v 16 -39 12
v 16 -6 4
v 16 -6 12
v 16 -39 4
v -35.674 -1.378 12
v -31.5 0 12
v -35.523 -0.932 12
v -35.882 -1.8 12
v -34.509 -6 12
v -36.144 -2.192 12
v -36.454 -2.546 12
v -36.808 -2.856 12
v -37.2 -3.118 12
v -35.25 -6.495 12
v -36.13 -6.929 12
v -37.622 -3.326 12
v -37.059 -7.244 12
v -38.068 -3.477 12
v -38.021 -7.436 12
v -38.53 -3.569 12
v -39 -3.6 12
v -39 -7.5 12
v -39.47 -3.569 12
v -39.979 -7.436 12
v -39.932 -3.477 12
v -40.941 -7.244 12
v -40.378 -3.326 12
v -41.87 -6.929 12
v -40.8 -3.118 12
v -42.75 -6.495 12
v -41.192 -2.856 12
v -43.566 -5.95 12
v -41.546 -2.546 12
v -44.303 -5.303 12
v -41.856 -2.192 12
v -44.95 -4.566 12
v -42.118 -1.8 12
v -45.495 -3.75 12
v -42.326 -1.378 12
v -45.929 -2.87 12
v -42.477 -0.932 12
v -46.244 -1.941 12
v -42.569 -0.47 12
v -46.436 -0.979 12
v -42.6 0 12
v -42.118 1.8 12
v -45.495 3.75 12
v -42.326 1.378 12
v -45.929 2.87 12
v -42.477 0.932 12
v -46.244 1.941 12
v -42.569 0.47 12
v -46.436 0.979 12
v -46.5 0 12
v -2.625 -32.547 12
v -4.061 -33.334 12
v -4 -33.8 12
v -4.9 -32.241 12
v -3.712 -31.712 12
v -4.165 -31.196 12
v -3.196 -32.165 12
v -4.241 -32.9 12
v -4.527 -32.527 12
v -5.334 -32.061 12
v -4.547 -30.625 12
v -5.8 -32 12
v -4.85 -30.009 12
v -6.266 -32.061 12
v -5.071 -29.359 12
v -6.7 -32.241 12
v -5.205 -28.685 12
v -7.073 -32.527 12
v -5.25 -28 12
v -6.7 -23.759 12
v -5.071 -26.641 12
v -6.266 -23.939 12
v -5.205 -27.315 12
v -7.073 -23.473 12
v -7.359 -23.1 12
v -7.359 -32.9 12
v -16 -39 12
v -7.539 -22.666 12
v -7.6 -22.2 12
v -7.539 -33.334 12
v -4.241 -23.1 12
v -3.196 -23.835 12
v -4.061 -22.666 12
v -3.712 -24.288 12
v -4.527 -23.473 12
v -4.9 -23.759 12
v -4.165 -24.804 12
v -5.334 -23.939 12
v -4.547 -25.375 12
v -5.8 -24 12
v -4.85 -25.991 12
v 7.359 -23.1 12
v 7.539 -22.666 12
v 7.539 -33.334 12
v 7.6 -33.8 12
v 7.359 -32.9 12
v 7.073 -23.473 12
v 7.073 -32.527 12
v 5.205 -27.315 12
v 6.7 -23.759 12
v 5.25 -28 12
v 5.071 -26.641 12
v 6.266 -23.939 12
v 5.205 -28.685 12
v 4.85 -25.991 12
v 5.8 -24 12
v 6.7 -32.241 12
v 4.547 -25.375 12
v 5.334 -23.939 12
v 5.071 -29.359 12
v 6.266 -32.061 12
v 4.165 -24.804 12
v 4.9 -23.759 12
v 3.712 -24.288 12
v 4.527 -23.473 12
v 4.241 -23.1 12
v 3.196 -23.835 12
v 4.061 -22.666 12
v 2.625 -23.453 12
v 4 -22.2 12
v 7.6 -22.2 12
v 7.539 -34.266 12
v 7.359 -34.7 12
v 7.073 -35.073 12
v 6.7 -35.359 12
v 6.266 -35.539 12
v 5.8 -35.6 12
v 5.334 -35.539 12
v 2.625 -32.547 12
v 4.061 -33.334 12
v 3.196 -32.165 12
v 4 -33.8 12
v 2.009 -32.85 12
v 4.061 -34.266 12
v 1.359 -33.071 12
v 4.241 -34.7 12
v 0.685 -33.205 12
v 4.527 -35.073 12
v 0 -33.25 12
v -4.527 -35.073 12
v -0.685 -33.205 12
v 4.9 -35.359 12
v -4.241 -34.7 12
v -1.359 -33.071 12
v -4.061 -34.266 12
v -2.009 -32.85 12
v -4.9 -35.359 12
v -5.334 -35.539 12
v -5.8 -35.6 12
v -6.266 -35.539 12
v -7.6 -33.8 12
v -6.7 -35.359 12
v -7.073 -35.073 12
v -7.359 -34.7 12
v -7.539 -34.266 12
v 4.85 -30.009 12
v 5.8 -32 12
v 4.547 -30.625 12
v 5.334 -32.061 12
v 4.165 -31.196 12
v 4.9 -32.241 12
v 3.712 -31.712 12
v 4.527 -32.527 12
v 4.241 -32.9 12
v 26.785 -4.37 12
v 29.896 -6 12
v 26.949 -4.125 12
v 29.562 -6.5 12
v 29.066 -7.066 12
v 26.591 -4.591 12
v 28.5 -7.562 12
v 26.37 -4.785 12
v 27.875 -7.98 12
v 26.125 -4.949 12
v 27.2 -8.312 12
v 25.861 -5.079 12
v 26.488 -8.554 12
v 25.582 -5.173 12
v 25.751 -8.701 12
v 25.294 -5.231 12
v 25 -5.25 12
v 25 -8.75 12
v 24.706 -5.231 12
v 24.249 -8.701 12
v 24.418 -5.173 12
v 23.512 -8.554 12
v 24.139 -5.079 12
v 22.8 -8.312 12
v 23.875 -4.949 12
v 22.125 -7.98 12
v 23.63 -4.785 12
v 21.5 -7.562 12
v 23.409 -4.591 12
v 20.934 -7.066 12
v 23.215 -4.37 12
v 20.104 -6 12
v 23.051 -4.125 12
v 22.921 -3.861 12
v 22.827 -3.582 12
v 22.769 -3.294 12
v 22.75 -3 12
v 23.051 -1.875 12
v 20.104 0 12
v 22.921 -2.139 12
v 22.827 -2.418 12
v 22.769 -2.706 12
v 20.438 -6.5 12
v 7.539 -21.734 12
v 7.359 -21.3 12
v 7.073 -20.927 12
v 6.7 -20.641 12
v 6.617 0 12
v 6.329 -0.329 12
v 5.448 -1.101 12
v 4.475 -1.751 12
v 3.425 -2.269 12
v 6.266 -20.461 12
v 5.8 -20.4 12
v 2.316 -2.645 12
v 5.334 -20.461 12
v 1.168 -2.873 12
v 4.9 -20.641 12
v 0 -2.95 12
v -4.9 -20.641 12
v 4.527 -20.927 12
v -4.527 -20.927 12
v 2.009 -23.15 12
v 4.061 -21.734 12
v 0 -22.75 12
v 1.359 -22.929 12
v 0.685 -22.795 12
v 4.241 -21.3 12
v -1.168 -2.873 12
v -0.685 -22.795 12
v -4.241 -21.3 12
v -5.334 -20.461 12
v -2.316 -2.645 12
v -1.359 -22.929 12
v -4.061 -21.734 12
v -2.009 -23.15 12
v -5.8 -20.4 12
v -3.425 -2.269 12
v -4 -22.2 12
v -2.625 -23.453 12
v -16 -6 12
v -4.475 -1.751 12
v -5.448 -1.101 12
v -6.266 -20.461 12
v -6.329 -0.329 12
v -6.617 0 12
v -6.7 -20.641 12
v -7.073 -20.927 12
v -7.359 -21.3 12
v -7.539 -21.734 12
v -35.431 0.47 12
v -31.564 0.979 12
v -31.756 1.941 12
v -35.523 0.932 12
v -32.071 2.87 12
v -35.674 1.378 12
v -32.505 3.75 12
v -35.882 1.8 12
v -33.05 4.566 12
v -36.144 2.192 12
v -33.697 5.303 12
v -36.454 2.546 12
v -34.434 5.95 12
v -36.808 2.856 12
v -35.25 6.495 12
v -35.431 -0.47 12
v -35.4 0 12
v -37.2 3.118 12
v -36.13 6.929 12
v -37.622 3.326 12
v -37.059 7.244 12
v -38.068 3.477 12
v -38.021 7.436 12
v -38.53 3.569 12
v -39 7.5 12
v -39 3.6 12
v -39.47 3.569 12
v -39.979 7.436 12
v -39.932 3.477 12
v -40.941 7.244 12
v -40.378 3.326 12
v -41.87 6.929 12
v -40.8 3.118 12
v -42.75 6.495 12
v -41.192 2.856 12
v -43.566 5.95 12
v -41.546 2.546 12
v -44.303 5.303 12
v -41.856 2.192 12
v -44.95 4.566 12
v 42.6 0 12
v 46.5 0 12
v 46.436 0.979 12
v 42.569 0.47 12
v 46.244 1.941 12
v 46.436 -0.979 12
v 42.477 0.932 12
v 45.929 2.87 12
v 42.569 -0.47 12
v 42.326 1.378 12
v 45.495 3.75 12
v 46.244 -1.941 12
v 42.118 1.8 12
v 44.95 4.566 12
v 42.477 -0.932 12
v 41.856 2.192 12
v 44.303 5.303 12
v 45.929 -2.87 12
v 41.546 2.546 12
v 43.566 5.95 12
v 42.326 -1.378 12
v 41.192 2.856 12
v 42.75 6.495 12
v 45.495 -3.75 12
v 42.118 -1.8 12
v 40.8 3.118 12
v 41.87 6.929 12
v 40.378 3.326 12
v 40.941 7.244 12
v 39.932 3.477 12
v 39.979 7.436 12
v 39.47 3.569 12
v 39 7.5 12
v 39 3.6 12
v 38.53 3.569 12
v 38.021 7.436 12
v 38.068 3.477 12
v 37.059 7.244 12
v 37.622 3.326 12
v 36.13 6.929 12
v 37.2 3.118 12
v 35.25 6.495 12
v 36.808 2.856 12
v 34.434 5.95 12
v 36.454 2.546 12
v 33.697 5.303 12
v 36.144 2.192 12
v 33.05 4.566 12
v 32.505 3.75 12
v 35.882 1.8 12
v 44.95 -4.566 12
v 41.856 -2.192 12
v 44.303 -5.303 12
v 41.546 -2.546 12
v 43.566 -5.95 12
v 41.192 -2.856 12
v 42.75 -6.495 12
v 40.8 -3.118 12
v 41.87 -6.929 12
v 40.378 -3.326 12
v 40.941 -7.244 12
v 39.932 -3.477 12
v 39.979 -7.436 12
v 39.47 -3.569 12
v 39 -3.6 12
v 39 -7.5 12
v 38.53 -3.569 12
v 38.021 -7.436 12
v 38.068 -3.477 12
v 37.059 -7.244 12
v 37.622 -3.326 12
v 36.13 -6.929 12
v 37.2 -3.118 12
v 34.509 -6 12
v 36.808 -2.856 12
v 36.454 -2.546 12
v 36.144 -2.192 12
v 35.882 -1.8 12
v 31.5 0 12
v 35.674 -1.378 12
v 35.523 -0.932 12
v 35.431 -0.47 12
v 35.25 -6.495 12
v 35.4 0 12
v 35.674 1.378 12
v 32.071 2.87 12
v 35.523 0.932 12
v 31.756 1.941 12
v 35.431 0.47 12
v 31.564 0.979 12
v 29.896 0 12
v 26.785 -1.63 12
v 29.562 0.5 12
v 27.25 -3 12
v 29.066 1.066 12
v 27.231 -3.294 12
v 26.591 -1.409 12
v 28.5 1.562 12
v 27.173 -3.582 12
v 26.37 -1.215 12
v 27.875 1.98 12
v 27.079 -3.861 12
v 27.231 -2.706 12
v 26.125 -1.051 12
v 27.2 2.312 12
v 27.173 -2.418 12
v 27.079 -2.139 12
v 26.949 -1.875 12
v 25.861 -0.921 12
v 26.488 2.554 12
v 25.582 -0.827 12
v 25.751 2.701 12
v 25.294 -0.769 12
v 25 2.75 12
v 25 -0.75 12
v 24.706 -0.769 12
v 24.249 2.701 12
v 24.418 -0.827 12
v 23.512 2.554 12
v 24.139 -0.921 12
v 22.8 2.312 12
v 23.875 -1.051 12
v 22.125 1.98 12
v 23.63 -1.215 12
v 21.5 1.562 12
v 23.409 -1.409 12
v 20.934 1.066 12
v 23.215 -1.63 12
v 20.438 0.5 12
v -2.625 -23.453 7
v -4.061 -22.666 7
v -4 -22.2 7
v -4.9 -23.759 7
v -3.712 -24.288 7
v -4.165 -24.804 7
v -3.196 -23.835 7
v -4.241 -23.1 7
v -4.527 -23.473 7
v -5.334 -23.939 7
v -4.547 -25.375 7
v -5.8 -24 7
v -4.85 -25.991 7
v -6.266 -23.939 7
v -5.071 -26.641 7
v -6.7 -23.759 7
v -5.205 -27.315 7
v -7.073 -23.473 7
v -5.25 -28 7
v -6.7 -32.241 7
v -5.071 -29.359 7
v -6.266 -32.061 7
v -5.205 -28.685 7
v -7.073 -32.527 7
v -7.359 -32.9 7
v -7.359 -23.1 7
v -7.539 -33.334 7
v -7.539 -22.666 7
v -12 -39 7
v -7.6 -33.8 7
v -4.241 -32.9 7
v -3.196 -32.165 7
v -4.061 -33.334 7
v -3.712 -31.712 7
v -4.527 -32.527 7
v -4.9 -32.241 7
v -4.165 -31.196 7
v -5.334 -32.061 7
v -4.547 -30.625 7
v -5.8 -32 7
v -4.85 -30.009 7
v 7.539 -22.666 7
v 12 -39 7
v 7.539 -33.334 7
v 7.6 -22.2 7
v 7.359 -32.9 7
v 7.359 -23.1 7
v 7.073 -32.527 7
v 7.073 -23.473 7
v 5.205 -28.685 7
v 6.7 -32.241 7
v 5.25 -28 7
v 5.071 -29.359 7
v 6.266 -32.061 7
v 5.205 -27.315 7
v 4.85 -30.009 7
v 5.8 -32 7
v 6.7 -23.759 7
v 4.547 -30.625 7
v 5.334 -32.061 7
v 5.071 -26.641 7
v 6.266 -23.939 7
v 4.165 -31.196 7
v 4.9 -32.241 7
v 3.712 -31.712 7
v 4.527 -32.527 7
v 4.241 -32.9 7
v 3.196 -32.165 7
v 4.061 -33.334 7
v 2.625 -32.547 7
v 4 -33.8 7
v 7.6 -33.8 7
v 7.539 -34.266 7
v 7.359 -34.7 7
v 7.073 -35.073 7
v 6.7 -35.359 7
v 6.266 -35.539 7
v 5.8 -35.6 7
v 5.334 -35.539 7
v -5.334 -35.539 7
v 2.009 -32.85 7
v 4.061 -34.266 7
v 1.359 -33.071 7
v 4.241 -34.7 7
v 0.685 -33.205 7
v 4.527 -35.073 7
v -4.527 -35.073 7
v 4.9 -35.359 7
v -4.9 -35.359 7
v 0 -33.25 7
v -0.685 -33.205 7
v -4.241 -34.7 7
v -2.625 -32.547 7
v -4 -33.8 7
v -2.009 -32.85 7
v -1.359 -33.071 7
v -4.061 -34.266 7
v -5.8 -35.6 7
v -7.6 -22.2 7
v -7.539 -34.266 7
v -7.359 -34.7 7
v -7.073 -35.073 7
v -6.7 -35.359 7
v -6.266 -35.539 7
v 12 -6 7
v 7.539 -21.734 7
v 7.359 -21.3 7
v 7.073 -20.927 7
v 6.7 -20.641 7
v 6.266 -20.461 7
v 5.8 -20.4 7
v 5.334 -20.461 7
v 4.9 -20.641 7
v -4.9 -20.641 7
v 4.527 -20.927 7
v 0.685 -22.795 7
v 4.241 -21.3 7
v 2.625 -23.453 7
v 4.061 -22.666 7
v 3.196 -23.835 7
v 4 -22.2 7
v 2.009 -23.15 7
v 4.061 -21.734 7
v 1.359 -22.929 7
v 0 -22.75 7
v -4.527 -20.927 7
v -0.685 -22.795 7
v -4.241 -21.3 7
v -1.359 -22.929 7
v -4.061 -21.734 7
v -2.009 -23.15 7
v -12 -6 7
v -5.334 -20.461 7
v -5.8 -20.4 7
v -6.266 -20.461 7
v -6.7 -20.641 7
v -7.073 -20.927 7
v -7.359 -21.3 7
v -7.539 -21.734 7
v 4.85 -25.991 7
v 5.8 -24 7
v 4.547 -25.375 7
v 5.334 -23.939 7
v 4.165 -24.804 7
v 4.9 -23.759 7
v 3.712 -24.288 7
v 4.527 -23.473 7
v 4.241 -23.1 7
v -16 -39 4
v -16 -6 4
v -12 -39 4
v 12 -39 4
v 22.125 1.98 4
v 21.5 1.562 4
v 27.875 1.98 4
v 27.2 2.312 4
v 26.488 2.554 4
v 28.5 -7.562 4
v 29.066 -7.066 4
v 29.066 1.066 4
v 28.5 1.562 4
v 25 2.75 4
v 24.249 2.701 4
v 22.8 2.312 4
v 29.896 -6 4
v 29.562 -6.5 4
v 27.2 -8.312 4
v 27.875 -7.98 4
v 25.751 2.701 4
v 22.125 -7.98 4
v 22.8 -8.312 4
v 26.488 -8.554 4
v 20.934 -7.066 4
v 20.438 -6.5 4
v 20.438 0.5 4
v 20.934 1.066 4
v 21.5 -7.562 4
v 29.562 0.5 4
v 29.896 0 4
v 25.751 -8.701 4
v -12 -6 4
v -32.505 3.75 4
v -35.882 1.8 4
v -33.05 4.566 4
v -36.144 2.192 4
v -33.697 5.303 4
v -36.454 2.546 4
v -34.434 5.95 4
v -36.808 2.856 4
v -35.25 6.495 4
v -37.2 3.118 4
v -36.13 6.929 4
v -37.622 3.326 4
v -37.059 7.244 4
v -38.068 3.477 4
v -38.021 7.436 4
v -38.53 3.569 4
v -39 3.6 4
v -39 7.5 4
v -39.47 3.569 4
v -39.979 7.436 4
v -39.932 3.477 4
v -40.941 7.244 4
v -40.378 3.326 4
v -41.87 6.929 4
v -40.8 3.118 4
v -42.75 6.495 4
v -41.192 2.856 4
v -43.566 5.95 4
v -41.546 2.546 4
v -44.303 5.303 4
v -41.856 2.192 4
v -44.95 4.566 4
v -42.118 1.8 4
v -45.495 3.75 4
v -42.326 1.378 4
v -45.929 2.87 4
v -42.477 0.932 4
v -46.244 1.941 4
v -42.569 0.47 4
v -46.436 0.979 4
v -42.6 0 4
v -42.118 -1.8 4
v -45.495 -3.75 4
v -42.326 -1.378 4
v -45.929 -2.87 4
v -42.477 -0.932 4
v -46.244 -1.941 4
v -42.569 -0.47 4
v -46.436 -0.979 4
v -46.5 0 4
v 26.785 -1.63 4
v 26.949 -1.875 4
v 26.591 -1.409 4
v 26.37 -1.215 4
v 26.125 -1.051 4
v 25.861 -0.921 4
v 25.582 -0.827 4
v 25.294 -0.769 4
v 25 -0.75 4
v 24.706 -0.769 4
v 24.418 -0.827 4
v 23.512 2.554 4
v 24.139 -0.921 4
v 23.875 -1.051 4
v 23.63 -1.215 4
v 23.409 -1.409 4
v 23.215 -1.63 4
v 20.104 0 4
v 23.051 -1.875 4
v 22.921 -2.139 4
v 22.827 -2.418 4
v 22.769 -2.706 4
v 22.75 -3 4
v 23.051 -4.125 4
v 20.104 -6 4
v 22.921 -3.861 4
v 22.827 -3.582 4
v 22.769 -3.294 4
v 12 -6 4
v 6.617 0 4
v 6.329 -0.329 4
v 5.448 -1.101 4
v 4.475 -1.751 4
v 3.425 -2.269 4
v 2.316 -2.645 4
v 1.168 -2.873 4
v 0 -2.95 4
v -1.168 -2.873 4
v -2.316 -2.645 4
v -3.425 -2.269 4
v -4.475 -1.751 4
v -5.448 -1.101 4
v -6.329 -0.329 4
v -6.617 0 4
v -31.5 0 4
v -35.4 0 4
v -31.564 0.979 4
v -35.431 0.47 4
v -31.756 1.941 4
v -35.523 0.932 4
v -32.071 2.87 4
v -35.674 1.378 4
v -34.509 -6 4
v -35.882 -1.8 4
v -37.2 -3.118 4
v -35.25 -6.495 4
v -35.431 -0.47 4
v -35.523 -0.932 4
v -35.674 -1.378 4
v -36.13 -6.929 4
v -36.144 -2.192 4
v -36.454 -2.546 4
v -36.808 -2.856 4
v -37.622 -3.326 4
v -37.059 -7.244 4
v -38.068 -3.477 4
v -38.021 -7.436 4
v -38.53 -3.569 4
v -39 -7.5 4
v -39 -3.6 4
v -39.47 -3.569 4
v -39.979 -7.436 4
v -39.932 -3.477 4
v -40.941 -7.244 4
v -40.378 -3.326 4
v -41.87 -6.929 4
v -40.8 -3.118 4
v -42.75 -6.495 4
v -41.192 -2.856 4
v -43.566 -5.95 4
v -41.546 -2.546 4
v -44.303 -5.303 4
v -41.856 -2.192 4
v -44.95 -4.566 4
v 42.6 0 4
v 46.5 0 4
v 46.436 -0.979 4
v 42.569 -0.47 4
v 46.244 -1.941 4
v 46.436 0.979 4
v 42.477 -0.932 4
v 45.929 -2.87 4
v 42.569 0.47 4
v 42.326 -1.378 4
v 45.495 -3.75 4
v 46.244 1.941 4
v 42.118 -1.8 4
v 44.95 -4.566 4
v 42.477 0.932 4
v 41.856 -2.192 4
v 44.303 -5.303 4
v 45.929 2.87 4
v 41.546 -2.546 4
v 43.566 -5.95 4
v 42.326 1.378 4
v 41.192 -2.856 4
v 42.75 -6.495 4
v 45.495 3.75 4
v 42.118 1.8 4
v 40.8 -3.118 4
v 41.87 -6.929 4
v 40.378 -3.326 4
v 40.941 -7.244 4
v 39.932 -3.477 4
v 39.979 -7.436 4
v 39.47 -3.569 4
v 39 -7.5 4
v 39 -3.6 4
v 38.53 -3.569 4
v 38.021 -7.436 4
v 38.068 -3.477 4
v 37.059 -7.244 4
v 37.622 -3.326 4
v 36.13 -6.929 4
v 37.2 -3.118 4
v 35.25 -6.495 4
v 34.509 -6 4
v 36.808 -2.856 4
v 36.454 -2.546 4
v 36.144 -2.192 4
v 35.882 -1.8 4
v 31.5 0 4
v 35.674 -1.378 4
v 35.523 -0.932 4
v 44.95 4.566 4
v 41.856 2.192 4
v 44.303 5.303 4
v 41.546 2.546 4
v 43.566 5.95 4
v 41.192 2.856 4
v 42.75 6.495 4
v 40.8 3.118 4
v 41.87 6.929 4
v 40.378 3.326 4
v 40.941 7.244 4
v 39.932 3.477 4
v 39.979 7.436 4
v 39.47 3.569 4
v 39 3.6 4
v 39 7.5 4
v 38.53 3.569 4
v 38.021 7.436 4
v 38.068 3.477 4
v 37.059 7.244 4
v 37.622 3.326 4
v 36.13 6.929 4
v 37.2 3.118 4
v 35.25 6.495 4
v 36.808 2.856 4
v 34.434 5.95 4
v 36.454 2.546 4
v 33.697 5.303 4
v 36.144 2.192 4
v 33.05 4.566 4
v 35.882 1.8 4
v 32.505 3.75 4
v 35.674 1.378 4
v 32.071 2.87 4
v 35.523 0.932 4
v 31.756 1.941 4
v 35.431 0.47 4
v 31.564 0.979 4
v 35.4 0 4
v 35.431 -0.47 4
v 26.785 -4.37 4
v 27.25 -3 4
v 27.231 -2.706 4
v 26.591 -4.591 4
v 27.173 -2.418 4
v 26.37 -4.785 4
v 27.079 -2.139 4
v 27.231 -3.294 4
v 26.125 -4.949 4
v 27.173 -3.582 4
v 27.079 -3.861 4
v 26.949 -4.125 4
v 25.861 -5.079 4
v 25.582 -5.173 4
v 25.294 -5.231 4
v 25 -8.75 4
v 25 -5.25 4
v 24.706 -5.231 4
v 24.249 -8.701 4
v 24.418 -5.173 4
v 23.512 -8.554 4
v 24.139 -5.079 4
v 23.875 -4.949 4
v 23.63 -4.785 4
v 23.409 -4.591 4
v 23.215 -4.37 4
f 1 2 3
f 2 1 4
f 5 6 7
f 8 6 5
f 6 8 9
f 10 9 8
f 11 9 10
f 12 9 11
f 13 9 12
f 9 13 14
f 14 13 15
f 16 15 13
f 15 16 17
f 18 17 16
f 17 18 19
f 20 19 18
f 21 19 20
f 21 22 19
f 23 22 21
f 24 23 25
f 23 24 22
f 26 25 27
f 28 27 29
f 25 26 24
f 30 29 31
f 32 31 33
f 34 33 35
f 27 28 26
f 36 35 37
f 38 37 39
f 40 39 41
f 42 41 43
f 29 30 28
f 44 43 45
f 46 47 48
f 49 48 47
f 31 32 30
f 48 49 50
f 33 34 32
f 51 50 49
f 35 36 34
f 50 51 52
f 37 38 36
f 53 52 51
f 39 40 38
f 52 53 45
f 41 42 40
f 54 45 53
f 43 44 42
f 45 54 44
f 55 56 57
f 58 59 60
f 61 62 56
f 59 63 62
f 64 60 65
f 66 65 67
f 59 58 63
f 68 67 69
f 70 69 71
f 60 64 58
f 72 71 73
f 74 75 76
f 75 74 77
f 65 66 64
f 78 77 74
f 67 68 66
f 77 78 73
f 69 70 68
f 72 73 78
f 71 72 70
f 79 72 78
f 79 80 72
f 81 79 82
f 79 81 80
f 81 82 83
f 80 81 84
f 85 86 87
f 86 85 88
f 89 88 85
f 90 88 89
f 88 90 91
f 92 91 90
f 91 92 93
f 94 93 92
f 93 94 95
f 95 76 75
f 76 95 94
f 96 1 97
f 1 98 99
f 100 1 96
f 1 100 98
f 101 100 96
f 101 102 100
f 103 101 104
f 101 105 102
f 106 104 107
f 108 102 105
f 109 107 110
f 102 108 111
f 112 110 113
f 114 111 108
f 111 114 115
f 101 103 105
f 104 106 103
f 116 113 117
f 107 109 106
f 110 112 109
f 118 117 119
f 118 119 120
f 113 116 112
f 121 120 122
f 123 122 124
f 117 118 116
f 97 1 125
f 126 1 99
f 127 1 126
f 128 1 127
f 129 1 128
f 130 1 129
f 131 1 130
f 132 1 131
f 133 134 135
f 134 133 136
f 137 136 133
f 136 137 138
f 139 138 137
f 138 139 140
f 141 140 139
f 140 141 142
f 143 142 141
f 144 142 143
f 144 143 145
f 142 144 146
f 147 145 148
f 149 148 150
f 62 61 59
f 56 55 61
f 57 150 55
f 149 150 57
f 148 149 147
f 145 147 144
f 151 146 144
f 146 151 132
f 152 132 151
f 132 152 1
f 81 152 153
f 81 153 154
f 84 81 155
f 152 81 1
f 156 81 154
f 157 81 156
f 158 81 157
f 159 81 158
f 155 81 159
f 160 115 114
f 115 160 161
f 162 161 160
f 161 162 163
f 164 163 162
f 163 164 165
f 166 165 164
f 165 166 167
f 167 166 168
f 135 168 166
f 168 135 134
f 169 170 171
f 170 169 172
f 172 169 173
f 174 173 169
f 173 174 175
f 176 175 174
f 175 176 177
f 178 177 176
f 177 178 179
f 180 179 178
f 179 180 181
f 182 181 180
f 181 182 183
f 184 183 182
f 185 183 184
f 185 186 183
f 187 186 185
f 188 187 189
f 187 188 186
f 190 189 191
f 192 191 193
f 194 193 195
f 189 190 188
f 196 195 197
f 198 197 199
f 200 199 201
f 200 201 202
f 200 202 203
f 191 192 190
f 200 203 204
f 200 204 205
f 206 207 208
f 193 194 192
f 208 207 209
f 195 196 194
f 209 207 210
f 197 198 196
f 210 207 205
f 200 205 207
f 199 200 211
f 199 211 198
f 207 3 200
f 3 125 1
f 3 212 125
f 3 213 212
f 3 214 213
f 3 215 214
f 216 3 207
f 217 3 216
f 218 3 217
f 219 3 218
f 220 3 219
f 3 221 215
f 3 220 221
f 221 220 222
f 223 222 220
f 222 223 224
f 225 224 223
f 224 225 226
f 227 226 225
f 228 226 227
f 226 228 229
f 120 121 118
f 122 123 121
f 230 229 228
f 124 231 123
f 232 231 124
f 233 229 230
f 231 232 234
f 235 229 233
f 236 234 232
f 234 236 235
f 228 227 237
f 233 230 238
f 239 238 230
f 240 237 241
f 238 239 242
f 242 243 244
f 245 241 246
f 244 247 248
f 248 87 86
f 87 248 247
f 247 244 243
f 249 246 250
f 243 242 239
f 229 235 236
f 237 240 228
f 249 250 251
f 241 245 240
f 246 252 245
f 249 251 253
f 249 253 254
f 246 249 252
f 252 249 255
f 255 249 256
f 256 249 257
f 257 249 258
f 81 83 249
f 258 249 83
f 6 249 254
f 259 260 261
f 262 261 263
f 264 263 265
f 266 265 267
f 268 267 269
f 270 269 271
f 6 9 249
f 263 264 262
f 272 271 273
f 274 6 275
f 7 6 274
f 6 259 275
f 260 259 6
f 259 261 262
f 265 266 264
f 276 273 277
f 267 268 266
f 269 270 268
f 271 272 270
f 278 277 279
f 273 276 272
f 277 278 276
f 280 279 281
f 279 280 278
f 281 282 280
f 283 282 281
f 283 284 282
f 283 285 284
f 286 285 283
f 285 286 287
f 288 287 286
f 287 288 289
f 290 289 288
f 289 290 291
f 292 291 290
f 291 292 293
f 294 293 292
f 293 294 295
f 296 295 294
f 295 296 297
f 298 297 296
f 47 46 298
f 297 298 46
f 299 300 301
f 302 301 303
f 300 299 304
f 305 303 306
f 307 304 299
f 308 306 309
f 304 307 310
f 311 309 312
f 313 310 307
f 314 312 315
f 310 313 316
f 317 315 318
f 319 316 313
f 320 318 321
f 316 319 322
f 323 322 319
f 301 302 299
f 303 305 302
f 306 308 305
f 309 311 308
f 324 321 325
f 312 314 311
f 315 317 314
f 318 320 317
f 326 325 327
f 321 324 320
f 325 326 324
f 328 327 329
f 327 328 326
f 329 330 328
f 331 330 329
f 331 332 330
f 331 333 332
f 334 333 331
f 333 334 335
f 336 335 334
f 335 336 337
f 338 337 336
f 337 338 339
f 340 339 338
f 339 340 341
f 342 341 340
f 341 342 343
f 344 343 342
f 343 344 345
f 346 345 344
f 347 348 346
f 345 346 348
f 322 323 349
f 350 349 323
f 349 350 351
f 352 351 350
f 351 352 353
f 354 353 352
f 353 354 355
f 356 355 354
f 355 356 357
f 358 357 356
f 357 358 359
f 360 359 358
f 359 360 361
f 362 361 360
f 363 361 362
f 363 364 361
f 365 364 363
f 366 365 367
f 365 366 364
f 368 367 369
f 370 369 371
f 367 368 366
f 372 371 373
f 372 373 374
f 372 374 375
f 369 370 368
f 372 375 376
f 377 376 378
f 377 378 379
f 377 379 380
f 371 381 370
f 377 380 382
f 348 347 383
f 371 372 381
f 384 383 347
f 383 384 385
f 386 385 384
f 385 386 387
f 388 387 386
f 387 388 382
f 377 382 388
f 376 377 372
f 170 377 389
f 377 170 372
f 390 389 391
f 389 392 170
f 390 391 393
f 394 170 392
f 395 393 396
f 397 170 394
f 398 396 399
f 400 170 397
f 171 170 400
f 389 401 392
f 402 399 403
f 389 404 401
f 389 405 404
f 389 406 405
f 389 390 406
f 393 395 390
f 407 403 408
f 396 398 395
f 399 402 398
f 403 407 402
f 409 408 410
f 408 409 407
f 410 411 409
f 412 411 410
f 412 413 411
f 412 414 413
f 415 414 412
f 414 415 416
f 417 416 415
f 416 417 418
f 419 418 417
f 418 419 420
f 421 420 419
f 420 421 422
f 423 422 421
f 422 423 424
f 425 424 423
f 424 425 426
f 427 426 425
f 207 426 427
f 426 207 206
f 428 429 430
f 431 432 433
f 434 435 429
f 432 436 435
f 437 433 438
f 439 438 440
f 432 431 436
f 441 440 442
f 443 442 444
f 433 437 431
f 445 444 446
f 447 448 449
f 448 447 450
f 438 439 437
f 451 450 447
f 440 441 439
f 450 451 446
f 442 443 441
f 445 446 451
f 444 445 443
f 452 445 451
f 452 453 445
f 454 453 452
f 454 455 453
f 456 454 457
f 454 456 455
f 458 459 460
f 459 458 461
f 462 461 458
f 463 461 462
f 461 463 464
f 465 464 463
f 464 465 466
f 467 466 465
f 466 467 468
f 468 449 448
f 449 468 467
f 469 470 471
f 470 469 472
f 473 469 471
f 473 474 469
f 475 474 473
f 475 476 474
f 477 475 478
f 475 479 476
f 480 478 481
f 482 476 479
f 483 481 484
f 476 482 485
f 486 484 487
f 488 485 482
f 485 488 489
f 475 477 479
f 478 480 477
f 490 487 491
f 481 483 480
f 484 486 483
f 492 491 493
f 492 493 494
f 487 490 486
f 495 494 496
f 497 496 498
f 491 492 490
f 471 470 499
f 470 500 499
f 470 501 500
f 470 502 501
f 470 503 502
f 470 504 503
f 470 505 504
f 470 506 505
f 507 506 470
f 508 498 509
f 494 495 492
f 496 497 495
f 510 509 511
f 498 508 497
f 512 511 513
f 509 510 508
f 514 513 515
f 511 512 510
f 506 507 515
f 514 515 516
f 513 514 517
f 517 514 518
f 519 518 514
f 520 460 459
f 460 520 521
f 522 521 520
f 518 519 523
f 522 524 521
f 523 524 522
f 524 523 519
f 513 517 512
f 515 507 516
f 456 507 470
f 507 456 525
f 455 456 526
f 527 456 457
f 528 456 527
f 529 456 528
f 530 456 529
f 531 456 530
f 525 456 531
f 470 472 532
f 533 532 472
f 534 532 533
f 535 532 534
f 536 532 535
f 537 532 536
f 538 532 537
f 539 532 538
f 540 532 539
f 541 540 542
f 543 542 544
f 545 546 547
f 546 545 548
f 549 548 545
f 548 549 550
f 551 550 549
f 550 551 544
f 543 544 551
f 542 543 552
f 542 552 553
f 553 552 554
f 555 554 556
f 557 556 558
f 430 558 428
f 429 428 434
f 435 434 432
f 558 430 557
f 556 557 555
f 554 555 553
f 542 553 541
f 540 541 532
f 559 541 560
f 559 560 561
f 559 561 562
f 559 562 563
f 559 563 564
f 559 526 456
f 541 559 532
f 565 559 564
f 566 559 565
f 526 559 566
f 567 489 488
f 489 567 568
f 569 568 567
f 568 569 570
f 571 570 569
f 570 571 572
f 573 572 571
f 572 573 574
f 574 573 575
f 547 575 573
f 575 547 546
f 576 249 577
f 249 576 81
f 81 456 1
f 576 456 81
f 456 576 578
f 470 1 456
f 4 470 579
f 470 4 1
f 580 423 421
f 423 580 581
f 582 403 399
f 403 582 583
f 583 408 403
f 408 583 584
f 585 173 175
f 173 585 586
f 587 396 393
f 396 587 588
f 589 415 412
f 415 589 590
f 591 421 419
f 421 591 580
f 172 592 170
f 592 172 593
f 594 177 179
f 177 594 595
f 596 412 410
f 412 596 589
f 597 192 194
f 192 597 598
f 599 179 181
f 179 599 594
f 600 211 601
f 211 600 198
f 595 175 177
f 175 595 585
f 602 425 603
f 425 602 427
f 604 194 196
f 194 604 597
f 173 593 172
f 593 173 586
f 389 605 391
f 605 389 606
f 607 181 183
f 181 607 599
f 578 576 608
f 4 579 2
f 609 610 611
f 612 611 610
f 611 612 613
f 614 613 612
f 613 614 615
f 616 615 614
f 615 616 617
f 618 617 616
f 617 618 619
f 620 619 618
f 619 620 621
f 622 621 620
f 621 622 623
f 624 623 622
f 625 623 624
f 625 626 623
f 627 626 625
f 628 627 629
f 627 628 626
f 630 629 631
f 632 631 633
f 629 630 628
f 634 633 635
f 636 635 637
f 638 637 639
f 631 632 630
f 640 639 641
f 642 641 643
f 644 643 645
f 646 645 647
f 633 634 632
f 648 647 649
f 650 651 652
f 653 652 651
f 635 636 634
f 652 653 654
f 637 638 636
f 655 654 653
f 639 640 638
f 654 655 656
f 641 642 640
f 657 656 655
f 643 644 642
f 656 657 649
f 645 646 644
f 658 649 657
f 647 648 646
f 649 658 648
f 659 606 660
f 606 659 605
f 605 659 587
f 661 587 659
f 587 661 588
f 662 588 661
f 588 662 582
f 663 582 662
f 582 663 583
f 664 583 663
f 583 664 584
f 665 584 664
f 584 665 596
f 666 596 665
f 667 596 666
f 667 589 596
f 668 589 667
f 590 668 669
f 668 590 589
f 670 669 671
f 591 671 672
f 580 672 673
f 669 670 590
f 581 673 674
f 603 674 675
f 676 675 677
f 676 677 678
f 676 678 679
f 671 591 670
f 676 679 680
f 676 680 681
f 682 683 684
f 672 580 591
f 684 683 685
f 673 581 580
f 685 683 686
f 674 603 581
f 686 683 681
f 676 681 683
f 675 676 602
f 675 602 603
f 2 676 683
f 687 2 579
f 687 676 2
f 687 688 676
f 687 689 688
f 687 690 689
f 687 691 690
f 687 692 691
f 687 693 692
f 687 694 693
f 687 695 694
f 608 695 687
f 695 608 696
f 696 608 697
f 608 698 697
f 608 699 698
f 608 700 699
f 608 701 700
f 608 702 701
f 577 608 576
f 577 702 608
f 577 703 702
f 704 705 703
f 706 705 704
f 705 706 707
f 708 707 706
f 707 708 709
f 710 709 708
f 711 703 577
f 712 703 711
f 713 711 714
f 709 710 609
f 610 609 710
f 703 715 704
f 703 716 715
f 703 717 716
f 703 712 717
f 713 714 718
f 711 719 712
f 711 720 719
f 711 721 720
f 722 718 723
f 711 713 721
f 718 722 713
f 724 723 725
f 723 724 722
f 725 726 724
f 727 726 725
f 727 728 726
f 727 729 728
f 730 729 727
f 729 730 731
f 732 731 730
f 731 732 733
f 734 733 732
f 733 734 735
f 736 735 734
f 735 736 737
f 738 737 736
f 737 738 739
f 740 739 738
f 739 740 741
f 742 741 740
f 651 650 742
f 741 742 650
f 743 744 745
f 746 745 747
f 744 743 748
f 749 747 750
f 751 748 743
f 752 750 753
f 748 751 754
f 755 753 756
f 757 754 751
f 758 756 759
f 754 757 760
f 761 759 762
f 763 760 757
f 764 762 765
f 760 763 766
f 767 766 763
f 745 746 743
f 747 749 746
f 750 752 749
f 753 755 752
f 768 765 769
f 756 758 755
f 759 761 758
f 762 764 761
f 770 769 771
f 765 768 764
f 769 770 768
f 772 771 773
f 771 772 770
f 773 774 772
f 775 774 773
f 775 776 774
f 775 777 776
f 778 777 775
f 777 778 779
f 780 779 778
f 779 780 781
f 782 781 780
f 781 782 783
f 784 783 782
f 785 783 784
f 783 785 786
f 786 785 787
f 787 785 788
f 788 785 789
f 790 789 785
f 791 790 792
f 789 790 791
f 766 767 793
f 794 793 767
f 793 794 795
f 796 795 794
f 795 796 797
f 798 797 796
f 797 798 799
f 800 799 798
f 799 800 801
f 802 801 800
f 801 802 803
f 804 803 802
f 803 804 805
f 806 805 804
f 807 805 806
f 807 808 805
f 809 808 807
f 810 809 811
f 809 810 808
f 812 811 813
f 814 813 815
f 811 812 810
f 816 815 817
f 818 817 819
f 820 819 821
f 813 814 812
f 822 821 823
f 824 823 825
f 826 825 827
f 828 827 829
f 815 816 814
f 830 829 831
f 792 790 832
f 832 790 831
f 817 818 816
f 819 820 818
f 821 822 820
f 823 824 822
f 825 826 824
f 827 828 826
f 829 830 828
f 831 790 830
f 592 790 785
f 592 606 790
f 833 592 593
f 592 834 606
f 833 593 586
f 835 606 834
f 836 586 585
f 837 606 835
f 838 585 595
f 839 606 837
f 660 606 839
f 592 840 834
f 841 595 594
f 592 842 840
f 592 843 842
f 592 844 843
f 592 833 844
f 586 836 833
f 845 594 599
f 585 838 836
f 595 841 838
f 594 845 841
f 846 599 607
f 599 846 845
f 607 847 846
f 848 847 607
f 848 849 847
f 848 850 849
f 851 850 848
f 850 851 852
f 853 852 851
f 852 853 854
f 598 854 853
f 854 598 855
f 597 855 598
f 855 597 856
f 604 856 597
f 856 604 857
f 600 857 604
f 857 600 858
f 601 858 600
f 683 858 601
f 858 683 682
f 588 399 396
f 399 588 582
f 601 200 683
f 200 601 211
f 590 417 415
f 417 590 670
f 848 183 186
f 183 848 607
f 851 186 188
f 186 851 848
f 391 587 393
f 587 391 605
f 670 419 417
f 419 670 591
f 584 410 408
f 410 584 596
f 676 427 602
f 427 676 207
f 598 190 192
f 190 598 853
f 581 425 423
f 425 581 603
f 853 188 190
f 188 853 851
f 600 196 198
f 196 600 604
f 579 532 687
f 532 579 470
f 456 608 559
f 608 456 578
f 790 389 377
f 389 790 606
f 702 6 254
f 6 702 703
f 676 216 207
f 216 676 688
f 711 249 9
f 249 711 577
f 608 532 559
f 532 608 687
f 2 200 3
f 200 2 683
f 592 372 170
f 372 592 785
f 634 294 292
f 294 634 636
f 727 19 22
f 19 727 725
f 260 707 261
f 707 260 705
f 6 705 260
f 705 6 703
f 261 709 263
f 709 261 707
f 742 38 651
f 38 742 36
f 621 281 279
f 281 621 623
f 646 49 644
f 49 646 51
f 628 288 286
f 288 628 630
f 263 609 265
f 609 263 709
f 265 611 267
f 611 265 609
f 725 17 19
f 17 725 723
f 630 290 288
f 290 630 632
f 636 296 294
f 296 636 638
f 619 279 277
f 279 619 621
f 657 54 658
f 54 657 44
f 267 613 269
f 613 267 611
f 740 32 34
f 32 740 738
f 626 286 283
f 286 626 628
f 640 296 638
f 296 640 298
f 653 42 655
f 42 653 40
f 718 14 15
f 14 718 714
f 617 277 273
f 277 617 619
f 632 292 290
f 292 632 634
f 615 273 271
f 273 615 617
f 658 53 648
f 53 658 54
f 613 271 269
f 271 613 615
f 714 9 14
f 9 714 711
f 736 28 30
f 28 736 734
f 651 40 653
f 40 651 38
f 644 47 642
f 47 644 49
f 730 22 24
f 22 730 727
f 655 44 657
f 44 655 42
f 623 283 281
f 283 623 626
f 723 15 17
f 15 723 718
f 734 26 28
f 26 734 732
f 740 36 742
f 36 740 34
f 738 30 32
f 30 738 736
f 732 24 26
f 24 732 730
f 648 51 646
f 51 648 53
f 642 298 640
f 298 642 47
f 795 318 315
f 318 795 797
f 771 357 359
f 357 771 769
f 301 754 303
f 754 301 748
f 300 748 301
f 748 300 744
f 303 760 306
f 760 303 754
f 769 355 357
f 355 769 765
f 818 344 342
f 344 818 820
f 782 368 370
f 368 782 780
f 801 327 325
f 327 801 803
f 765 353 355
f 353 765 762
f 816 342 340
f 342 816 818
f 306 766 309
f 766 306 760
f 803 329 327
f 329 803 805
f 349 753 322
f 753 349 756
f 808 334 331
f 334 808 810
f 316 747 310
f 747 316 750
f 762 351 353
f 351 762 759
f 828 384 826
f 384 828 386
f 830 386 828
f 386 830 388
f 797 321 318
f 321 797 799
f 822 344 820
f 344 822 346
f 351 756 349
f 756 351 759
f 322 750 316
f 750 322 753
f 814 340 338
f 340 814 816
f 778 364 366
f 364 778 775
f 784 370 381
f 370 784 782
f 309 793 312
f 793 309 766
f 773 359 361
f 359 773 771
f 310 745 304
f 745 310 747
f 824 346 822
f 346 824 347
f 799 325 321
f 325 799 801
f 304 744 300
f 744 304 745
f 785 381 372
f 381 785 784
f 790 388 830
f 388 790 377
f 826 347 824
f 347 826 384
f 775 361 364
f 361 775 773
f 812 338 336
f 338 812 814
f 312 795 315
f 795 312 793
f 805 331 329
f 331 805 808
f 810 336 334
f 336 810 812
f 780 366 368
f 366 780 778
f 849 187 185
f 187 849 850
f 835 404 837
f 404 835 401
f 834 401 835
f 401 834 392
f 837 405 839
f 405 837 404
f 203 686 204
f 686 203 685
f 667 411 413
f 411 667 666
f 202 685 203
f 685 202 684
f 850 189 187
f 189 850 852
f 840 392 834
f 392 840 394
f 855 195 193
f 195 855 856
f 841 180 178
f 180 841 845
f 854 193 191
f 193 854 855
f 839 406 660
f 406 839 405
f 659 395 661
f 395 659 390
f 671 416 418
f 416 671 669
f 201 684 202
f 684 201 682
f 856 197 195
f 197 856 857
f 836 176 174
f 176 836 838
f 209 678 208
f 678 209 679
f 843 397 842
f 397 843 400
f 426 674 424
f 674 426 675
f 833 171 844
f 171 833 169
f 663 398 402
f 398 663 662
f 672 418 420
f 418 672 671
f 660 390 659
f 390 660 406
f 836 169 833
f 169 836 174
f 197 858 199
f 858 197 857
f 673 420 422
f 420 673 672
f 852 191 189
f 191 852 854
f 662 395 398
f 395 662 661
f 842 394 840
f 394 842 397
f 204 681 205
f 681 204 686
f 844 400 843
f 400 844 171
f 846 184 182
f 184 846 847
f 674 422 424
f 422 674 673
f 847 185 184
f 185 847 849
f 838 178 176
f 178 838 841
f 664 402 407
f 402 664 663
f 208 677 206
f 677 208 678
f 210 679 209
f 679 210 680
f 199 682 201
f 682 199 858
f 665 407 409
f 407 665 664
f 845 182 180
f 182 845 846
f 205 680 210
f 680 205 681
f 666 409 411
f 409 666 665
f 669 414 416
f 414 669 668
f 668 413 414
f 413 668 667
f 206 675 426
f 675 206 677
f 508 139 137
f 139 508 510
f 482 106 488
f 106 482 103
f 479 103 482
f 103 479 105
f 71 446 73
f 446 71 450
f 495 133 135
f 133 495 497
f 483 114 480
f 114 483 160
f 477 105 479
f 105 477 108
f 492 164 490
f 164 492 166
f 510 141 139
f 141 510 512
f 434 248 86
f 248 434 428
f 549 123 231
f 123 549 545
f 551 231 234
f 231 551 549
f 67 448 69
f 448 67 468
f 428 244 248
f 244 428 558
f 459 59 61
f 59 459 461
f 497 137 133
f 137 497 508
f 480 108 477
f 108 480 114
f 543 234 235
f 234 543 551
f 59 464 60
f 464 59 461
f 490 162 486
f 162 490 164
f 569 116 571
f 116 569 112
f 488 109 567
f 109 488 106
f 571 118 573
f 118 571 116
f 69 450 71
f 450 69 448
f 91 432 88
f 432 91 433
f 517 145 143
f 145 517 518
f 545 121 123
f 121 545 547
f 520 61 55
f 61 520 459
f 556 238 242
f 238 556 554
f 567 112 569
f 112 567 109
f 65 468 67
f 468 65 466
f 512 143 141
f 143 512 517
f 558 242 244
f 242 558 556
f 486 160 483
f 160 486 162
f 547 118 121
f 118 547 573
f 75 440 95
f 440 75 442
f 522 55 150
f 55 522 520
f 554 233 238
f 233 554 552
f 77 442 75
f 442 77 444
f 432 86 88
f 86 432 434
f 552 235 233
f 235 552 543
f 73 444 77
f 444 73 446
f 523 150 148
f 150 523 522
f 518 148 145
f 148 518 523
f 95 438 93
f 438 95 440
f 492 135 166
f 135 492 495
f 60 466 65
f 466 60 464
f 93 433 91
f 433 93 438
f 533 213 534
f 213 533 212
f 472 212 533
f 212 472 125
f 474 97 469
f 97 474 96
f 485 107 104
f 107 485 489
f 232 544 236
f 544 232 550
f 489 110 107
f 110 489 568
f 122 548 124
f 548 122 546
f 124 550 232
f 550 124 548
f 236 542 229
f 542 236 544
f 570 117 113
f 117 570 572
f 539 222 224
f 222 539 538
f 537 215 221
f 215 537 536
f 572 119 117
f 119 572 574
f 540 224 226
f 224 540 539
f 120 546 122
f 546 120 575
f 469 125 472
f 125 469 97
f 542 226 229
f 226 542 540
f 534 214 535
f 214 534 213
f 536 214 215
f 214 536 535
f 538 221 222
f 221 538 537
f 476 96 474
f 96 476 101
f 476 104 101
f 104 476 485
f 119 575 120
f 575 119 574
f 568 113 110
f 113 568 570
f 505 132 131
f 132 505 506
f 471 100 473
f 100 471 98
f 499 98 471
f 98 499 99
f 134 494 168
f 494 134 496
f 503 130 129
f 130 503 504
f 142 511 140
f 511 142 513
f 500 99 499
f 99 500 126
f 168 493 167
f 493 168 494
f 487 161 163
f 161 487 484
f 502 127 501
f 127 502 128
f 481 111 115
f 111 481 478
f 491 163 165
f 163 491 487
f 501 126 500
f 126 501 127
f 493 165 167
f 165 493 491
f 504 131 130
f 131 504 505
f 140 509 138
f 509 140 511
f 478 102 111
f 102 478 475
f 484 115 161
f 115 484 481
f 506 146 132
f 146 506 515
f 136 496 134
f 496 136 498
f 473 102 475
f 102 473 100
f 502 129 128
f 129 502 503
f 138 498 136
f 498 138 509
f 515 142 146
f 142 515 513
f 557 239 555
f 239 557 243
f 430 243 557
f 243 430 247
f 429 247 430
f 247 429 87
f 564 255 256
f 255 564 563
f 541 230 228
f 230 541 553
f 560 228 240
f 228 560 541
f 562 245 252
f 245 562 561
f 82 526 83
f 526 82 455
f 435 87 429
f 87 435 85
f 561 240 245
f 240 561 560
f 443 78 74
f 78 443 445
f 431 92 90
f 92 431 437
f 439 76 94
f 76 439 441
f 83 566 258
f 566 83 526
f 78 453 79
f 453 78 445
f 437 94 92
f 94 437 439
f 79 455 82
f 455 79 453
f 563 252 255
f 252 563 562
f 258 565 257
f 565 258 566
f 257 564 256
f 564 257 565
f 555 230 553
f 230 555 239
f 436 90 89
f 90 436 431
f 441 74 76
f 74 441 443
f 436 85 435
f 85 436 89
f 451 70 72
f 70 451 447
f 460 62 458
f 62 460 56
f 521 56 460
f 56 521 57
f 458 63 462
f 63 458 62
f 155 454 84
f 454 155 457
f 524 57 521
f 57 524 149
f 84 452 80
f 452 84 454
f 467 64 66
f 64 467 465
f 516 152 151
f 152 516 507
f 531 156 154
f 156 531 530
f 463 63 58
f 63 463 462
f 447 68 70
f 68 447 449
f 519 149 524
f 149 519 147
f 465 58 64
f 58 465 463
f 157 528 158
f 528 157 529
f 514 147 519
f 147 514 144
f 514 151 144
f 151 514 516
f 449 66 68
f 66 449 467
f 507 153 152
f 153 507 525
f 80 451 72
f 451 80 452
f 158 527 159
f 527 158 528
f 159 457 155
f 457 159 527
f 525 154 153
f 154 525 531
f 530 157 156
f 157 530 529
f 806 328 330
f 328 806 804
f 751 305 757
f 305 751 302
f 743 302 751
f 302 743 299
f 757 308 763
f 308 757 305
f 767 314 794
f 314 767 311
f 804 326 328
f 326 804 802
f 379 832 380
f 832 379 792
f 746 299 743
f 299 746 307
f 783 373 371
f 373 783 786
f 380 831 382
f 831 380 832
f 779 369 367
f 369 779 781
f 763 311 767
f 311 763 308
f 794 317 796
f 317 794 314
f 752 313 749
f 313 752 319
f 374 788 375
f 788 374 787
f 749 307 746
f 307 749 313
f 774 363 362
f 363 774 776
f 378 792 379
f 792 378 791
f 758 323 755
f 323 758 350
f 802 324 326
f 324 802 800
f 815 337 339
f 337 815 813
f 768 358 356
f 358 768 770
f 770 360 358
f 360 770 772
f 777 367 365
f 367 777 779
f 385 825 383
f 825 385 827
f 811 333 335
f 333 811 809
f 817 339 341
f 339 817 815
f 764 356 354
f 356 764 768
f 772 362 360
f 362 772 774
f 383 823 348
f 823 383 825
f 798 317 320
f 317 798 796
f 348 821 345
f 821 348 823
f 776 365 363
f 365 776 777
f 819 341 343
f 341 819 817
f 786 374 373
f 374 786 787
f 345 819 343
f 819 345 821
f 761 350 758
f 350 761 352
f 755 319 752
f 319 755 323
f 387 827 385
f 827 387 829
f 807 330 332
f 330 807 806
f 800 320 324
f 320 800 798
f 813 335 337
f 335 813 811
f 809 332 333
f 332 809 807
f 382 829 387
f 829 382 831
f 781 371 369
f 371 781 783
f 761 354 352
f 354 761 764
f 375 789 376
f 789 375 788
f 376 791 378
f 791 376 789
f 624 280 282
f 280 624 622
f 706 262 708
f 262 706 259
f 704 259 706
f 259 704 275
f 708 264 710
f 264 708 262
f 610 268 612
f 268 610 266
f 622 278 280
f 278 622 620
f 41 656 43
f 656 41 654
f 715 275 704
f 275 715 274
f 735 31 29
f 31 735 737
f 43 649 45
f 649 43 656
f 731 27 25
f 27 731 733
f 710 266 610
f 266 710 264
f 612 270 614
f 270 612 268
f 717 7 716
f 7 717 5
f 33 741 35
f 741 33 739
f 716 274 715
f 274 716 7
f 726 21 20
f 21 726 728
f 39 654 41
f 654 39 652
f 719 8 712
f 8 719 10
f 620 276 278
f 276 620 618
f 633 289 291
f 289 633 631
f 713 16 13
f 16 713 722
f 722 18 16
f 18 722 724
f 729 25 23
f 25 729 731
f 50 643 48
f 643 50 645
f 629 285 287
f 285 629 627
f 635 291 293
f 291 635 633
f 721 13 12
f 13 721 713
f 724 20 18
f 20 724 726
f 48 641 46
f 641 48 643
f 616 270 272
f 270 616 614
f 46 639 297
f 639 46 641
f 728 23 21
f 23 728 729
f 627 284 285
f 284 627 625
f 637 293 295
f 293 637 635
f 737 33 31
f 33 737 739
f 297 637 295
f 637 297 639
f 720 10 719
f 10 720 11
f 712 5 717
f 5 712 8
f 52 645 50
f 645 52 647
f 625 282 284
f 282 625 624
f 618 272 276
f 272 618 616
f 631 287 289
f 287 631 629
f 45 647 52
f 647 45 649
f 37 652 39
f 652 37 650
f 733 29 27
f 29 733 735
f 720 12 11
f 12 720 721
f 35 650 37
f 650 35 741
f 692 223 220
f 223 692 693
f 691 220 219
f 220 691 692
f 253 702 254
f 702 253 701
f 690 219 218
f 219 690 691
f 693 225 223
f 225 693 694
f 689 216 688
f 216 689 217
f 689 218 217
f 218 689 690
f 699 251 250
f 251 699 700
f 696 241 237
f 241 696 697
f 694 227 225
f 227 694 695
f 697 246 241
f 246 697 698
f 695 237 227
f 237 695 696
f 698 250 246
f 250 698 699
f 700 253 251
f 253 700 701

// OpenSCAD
// This holder is intended for use without cover for pen or cutter.
// Tie pen or cutter
   DiaM3=3.6; // fix  with M3
   DiaM4 = 4.5; // Z switch activation
   DiaM6=6.8; // M6 shaft 
   DiaTie=3.9;  // somewhat larger
   DiaCutter=11.9;  //11.8
   Height=60;   // 80
   LM6Height = 24;    // was 24 for one LM6UU   44 for 2



   color("lime")          
         
 rotate([0,0,0])  //180 no need to rotate in Slic3R        
   {        
difference()
{ 
  union()
  {                    
   // Central Pen - Cutter holder
      
   //  translate([0,6,-28.0-10])  // -1.5  
  //     cylinder(h=Height ,d=DiaCutter+10+5 ,center=true,$fn=48);  //53
                    
 
 // connect central  part:   
      /*
        translate([0,2.5,-10-10])
      cube([76,5,LM6Height],center=true);   
         */  
      
      // fix acme
       translate([0,-20.5,9.5])                  
     cube([32,37,5],center=true);    
       
   // push Z switch 

    translate([24.5+0.5,-3,8])           
        cylinder(h=8,d=DiaM4+7, center=true,$fn=48);  //h28 
       
             ////////////////////////////////
             
     //  reinforcement 
             
 translate([14.0,-20.5,8])   //..9.5
      cube([4.0,37,8]  ,center=true); //.28           
          
            
 translate([-14.0,-20.5,8])           //
      cube([4.0,37,8]  ,center=true);   //                          
            
    // central  reinforcement between linear shafts
   
     translate([0,-3,8])   //..9.5
      cube([86.0,6,8]  ,center=true); //   


// LM6 shafts: 
 translate([-39,0,8])
       cylinder(h=8 ,d=15 ,center=true,$fn=48);  //
     
       translate([39,0,8])
       cylinder(h=8 ,d=15 ,center=true,$fn=48);  //
   
                                 
  }    
            // END UNION
      
       // push Z switch
       
       translate([25,-3,0])            
      cylinder(h=34,d=DiaM4, center=true,$fn=48);  //h28
    
  
    
  // ACME FIX NUT TRAPEZOIDEAL SCREW:
    
     translate([0,-28,10])  //    
      cylinder(h=20,d=10.5,center=true,$fn=48); 
    
    // FIX ACME     
    translate([5.8,-28+5.8,10])  //   
      cylinder(h=20,d=DiaM3,center=true,$fn=24);      
                
    translate([5.8,-28-5.8,10])  // 
      cylinder(h=20,d=DiaM3,center=true,$fn=24); 
    
     translate([-5.8,-28+5.8,10])  //   
      cylinder(h=20,d=DiaM3,center=true,$fn=24);      
                
    translate([-5.8,-28-5.8,10])  // 
      cylinder(h=20,d=DiaM3,center=true,$fn=24); 
       
    
  
 // left shaft  
      translate([39,0,5])
       cylinder(h=25 ,d=7.2 ,center=true,$fn=48);  //
         
 // right shaft
 
      translate([-39,0,5])
       cylinder(h=25 ,d=7.2 ,center=true,$fn=48);  //
       
     
// 3 mm room for pen or cutter:

translate([0,6,-25])
       cylinder(h=Height*3 ,d=DiaCutter+6,center=true,$fn=48);  
       
  
    
    }
 }  // end rotate
         
         
